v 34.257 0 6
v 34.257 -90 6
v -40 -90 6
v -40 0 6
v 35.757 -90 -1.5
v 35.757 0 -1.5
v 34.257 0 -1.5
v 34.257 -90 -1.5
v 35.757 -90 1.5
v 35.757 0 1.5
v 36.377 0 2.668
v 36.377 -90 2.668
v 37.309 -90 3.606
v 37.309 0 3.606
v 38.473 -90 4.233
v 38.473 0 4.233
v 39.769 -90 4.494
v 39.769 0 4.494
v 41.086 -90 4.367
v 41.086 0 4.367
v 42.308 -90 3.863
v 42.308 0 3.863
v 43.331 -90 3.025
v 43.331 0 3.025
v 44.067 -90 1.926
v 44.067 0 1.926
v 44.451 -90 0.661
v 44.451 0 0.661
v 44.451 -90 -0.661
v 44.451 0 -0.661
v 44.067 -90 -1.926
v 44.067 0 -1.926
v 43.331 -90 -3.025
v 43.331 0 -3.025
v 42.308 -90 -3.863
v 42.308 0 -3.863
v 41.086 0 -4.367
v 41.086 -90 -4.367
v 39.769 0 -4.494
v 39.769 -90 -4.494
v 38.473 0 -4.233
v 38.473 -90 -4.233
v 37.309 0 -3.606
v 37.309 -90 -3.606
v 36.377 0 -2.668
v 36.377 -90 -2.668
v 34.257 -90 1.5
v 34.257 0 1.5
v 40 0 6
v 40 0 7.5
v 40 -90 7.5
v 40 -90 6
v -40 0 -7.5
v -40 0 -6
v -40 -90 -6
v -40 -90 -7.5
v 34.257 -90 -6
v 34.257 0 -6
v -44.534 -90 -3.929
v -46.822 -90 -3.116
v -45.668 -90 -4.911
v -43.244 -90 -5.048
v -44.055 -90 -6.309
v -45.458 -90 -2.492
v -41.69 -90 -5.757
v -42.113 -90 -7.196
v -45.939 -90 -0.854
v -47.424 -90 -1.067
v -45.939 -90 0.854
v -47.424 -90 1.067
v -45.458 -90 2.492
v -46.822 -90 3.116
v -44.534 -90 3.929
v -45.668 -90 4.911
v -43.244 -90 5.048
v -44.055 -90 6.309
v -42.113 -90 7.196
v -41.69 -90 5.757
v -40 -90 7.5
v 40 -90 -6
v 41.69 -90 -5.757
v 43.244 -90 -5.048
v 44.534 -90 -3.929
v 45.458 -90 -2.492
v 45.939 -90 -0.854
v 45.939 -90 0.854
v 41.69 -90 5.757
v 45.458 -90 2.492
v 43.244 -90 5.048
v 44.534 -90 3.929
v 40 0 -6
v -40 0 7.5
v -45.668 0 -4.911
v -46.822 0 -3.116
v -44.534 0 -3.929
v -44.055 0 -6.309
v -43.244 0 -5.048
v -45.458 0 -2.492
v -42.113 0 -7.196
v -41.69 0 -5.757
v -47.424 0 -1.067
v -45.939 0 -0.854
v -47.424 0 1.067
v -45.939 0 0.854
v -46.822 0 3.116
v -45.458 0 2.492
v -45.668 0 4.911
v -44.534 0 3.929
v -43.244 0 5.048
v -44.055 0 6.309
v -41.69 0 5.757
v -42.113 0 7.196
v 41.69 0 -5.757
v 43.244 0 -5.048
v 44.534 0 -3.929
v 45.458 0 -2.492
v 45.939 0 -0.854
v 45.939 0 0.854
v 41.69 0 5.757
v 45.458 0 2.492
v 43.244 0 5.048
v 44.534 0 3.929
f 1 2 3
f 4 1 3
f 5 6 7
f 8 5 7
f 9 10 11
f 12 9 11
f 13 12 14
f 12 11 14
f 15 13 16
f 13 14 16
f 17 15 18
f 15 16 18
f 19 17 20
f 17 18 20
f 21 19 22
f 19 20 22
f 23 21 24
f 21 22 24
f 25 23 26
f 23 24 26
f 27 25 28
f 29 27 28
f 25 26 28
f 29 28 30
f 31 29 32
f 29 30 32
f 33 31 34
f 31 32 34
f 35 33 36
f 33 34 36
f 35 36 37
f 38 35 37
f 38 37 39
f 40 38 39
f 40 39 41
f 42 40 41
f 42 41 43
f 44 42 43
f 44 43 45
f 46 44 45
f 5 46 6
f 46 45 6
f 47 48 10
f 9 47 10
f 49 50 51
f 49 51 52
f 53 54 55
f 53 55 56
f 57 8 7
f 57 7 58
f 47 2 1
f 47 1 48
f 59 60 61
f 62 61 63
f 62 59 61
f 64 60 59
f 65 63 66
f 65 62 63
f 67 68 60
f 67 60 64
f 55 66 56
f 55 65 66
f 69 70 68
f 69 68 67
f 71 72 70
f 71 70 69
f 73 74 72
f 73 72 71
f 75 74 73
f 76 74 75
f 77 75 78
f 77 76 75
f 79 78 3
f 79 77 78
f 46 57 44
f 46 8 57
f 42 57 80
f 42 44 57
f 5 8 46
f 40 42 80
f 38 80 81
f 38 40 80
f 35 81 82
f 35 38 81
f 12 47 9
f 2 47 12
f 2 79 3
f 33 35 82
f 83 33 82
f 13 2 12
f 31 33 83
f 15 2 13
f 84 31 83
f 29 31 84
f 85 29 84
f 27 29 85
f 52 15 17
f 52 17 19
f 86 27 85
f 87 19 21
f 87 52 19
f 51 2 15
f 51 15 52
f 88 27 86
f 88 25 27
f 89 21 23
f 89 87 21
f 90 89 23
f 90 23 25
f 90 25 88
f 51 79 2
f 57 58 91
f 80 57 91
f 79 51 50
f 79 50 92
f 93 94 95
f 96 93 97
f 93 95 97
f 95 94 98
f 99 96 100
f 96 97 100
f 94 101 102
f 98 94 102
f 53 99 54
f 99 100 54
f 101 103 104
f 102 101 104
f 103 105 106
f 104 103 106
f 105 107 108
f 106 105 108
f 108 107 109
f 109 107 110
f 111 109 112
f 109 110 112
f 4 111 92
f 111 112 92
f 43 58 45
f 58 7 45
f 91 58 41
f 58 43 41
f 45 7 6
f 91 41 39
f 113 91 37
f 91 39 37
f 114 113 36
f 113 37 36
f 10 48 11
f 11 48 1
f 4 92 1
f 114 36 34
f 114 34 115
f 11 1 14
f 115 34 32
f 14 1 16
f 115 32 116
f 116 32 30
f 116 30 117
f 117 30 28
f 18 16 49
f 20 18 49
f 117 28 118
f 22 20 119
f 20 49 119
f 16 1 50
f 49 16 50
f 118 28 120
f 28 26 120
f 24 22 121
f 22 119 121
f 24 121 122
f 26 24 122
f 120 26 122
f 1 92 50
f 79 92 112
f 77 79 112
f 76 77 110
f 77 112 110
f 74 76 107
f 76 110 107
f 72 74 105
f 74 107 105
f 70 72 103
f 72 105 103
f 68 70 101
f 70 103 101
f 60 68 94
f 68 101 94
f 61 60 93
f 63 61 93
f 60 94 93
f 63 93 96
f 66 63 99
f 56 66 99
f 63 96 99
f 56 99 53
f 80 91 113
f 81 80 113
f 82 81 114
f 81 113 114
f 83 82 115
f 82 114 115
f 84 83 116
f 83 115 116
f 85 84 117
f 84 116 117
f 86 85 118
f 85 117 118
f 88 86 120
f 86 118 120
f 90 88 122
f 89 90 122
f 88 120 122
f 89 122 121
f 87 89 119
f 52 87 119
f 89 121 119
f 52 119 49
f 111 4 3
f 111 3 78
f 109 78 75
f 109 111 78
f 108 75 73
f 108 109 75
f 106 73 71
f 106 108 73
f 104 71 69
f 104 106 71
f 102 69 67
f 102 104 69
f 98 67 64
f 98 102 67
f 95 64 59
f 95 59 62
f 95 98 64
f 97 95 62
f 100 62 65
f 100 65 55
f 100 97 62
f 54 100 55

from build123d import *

# Parameters (mm, degrees)
F1_DEPTH = 90
F2_T     = -1.5
F4_DEPTH = 90.001
F6_DEPTH = 90


with BuildPart() as f1:
    # F0 (on Front) → F1 (new body)
    with BuildSketch(Plane.XZ):
        with BuildLine():
            ThreePointArc((40, -7.5), (47.5, 0), (40, 7.5))
            Line((40, 7.5), (-40, 7.5))
            ThreePointArc((-40, 7.5), (-47.5, 0), (-40, -7.5))
            Line((-40, -7.5), (40, -7.5))
        make_face()
    extrude(amount=F1_DEPTH)

    # F2
    f2_openings = [f1.faces().sort_by_distance(p)[0] for p in [
        (0, -90, 0),
        (0, 0, 0),
    ]]
    offset(amount=F2_T, openings=f2_openings)

    # F3 (on Front) → F4 (cut, through all)
    with BuildSketch(Plane.XZ):
        with BuildLine():
            ThreePointArc((40, 6), (46, 0), (40, -6))
            Line((40, -6), (-40, -6))
            Line((-40, -6), (-40, -7.5))
            Line((-40, -7.5), (40, -7.5))
            ThreePointArc((40, -7.5), (47.5, 0), (40, 7.5))
            Line((40, 7.5), (40, 6))
        make_face()
    extrude(amount=F4_DEPTH, mode=Mode.SUBTRACT)

    # F5 (on Front) → F6 (join, through all)
    with BuildSketch(Plane.XZ):
        with BuildLine():
            Line((34.257359, -6), (40, -6))
            ThreePointArc((40, -6), (46, 0), (40, 6))
            Line((40, 6), (34.257359, 6))
            Line((34.257359, 6), (34.257359, 1.5))
            Line((34.257359, 1.5), (35.757359, 1.5))
            ThreePointArc((35.757359, 1.5), (44.5, 0), (35.757359, -1.5))
            Line((35.757359, -1.5), (34.257359, -1.5))
            Line((34.257359, -1.5), (34.257359, -6))
        make_face()
    extrude(amount=F6_DEPTH)


solid = f1.part
